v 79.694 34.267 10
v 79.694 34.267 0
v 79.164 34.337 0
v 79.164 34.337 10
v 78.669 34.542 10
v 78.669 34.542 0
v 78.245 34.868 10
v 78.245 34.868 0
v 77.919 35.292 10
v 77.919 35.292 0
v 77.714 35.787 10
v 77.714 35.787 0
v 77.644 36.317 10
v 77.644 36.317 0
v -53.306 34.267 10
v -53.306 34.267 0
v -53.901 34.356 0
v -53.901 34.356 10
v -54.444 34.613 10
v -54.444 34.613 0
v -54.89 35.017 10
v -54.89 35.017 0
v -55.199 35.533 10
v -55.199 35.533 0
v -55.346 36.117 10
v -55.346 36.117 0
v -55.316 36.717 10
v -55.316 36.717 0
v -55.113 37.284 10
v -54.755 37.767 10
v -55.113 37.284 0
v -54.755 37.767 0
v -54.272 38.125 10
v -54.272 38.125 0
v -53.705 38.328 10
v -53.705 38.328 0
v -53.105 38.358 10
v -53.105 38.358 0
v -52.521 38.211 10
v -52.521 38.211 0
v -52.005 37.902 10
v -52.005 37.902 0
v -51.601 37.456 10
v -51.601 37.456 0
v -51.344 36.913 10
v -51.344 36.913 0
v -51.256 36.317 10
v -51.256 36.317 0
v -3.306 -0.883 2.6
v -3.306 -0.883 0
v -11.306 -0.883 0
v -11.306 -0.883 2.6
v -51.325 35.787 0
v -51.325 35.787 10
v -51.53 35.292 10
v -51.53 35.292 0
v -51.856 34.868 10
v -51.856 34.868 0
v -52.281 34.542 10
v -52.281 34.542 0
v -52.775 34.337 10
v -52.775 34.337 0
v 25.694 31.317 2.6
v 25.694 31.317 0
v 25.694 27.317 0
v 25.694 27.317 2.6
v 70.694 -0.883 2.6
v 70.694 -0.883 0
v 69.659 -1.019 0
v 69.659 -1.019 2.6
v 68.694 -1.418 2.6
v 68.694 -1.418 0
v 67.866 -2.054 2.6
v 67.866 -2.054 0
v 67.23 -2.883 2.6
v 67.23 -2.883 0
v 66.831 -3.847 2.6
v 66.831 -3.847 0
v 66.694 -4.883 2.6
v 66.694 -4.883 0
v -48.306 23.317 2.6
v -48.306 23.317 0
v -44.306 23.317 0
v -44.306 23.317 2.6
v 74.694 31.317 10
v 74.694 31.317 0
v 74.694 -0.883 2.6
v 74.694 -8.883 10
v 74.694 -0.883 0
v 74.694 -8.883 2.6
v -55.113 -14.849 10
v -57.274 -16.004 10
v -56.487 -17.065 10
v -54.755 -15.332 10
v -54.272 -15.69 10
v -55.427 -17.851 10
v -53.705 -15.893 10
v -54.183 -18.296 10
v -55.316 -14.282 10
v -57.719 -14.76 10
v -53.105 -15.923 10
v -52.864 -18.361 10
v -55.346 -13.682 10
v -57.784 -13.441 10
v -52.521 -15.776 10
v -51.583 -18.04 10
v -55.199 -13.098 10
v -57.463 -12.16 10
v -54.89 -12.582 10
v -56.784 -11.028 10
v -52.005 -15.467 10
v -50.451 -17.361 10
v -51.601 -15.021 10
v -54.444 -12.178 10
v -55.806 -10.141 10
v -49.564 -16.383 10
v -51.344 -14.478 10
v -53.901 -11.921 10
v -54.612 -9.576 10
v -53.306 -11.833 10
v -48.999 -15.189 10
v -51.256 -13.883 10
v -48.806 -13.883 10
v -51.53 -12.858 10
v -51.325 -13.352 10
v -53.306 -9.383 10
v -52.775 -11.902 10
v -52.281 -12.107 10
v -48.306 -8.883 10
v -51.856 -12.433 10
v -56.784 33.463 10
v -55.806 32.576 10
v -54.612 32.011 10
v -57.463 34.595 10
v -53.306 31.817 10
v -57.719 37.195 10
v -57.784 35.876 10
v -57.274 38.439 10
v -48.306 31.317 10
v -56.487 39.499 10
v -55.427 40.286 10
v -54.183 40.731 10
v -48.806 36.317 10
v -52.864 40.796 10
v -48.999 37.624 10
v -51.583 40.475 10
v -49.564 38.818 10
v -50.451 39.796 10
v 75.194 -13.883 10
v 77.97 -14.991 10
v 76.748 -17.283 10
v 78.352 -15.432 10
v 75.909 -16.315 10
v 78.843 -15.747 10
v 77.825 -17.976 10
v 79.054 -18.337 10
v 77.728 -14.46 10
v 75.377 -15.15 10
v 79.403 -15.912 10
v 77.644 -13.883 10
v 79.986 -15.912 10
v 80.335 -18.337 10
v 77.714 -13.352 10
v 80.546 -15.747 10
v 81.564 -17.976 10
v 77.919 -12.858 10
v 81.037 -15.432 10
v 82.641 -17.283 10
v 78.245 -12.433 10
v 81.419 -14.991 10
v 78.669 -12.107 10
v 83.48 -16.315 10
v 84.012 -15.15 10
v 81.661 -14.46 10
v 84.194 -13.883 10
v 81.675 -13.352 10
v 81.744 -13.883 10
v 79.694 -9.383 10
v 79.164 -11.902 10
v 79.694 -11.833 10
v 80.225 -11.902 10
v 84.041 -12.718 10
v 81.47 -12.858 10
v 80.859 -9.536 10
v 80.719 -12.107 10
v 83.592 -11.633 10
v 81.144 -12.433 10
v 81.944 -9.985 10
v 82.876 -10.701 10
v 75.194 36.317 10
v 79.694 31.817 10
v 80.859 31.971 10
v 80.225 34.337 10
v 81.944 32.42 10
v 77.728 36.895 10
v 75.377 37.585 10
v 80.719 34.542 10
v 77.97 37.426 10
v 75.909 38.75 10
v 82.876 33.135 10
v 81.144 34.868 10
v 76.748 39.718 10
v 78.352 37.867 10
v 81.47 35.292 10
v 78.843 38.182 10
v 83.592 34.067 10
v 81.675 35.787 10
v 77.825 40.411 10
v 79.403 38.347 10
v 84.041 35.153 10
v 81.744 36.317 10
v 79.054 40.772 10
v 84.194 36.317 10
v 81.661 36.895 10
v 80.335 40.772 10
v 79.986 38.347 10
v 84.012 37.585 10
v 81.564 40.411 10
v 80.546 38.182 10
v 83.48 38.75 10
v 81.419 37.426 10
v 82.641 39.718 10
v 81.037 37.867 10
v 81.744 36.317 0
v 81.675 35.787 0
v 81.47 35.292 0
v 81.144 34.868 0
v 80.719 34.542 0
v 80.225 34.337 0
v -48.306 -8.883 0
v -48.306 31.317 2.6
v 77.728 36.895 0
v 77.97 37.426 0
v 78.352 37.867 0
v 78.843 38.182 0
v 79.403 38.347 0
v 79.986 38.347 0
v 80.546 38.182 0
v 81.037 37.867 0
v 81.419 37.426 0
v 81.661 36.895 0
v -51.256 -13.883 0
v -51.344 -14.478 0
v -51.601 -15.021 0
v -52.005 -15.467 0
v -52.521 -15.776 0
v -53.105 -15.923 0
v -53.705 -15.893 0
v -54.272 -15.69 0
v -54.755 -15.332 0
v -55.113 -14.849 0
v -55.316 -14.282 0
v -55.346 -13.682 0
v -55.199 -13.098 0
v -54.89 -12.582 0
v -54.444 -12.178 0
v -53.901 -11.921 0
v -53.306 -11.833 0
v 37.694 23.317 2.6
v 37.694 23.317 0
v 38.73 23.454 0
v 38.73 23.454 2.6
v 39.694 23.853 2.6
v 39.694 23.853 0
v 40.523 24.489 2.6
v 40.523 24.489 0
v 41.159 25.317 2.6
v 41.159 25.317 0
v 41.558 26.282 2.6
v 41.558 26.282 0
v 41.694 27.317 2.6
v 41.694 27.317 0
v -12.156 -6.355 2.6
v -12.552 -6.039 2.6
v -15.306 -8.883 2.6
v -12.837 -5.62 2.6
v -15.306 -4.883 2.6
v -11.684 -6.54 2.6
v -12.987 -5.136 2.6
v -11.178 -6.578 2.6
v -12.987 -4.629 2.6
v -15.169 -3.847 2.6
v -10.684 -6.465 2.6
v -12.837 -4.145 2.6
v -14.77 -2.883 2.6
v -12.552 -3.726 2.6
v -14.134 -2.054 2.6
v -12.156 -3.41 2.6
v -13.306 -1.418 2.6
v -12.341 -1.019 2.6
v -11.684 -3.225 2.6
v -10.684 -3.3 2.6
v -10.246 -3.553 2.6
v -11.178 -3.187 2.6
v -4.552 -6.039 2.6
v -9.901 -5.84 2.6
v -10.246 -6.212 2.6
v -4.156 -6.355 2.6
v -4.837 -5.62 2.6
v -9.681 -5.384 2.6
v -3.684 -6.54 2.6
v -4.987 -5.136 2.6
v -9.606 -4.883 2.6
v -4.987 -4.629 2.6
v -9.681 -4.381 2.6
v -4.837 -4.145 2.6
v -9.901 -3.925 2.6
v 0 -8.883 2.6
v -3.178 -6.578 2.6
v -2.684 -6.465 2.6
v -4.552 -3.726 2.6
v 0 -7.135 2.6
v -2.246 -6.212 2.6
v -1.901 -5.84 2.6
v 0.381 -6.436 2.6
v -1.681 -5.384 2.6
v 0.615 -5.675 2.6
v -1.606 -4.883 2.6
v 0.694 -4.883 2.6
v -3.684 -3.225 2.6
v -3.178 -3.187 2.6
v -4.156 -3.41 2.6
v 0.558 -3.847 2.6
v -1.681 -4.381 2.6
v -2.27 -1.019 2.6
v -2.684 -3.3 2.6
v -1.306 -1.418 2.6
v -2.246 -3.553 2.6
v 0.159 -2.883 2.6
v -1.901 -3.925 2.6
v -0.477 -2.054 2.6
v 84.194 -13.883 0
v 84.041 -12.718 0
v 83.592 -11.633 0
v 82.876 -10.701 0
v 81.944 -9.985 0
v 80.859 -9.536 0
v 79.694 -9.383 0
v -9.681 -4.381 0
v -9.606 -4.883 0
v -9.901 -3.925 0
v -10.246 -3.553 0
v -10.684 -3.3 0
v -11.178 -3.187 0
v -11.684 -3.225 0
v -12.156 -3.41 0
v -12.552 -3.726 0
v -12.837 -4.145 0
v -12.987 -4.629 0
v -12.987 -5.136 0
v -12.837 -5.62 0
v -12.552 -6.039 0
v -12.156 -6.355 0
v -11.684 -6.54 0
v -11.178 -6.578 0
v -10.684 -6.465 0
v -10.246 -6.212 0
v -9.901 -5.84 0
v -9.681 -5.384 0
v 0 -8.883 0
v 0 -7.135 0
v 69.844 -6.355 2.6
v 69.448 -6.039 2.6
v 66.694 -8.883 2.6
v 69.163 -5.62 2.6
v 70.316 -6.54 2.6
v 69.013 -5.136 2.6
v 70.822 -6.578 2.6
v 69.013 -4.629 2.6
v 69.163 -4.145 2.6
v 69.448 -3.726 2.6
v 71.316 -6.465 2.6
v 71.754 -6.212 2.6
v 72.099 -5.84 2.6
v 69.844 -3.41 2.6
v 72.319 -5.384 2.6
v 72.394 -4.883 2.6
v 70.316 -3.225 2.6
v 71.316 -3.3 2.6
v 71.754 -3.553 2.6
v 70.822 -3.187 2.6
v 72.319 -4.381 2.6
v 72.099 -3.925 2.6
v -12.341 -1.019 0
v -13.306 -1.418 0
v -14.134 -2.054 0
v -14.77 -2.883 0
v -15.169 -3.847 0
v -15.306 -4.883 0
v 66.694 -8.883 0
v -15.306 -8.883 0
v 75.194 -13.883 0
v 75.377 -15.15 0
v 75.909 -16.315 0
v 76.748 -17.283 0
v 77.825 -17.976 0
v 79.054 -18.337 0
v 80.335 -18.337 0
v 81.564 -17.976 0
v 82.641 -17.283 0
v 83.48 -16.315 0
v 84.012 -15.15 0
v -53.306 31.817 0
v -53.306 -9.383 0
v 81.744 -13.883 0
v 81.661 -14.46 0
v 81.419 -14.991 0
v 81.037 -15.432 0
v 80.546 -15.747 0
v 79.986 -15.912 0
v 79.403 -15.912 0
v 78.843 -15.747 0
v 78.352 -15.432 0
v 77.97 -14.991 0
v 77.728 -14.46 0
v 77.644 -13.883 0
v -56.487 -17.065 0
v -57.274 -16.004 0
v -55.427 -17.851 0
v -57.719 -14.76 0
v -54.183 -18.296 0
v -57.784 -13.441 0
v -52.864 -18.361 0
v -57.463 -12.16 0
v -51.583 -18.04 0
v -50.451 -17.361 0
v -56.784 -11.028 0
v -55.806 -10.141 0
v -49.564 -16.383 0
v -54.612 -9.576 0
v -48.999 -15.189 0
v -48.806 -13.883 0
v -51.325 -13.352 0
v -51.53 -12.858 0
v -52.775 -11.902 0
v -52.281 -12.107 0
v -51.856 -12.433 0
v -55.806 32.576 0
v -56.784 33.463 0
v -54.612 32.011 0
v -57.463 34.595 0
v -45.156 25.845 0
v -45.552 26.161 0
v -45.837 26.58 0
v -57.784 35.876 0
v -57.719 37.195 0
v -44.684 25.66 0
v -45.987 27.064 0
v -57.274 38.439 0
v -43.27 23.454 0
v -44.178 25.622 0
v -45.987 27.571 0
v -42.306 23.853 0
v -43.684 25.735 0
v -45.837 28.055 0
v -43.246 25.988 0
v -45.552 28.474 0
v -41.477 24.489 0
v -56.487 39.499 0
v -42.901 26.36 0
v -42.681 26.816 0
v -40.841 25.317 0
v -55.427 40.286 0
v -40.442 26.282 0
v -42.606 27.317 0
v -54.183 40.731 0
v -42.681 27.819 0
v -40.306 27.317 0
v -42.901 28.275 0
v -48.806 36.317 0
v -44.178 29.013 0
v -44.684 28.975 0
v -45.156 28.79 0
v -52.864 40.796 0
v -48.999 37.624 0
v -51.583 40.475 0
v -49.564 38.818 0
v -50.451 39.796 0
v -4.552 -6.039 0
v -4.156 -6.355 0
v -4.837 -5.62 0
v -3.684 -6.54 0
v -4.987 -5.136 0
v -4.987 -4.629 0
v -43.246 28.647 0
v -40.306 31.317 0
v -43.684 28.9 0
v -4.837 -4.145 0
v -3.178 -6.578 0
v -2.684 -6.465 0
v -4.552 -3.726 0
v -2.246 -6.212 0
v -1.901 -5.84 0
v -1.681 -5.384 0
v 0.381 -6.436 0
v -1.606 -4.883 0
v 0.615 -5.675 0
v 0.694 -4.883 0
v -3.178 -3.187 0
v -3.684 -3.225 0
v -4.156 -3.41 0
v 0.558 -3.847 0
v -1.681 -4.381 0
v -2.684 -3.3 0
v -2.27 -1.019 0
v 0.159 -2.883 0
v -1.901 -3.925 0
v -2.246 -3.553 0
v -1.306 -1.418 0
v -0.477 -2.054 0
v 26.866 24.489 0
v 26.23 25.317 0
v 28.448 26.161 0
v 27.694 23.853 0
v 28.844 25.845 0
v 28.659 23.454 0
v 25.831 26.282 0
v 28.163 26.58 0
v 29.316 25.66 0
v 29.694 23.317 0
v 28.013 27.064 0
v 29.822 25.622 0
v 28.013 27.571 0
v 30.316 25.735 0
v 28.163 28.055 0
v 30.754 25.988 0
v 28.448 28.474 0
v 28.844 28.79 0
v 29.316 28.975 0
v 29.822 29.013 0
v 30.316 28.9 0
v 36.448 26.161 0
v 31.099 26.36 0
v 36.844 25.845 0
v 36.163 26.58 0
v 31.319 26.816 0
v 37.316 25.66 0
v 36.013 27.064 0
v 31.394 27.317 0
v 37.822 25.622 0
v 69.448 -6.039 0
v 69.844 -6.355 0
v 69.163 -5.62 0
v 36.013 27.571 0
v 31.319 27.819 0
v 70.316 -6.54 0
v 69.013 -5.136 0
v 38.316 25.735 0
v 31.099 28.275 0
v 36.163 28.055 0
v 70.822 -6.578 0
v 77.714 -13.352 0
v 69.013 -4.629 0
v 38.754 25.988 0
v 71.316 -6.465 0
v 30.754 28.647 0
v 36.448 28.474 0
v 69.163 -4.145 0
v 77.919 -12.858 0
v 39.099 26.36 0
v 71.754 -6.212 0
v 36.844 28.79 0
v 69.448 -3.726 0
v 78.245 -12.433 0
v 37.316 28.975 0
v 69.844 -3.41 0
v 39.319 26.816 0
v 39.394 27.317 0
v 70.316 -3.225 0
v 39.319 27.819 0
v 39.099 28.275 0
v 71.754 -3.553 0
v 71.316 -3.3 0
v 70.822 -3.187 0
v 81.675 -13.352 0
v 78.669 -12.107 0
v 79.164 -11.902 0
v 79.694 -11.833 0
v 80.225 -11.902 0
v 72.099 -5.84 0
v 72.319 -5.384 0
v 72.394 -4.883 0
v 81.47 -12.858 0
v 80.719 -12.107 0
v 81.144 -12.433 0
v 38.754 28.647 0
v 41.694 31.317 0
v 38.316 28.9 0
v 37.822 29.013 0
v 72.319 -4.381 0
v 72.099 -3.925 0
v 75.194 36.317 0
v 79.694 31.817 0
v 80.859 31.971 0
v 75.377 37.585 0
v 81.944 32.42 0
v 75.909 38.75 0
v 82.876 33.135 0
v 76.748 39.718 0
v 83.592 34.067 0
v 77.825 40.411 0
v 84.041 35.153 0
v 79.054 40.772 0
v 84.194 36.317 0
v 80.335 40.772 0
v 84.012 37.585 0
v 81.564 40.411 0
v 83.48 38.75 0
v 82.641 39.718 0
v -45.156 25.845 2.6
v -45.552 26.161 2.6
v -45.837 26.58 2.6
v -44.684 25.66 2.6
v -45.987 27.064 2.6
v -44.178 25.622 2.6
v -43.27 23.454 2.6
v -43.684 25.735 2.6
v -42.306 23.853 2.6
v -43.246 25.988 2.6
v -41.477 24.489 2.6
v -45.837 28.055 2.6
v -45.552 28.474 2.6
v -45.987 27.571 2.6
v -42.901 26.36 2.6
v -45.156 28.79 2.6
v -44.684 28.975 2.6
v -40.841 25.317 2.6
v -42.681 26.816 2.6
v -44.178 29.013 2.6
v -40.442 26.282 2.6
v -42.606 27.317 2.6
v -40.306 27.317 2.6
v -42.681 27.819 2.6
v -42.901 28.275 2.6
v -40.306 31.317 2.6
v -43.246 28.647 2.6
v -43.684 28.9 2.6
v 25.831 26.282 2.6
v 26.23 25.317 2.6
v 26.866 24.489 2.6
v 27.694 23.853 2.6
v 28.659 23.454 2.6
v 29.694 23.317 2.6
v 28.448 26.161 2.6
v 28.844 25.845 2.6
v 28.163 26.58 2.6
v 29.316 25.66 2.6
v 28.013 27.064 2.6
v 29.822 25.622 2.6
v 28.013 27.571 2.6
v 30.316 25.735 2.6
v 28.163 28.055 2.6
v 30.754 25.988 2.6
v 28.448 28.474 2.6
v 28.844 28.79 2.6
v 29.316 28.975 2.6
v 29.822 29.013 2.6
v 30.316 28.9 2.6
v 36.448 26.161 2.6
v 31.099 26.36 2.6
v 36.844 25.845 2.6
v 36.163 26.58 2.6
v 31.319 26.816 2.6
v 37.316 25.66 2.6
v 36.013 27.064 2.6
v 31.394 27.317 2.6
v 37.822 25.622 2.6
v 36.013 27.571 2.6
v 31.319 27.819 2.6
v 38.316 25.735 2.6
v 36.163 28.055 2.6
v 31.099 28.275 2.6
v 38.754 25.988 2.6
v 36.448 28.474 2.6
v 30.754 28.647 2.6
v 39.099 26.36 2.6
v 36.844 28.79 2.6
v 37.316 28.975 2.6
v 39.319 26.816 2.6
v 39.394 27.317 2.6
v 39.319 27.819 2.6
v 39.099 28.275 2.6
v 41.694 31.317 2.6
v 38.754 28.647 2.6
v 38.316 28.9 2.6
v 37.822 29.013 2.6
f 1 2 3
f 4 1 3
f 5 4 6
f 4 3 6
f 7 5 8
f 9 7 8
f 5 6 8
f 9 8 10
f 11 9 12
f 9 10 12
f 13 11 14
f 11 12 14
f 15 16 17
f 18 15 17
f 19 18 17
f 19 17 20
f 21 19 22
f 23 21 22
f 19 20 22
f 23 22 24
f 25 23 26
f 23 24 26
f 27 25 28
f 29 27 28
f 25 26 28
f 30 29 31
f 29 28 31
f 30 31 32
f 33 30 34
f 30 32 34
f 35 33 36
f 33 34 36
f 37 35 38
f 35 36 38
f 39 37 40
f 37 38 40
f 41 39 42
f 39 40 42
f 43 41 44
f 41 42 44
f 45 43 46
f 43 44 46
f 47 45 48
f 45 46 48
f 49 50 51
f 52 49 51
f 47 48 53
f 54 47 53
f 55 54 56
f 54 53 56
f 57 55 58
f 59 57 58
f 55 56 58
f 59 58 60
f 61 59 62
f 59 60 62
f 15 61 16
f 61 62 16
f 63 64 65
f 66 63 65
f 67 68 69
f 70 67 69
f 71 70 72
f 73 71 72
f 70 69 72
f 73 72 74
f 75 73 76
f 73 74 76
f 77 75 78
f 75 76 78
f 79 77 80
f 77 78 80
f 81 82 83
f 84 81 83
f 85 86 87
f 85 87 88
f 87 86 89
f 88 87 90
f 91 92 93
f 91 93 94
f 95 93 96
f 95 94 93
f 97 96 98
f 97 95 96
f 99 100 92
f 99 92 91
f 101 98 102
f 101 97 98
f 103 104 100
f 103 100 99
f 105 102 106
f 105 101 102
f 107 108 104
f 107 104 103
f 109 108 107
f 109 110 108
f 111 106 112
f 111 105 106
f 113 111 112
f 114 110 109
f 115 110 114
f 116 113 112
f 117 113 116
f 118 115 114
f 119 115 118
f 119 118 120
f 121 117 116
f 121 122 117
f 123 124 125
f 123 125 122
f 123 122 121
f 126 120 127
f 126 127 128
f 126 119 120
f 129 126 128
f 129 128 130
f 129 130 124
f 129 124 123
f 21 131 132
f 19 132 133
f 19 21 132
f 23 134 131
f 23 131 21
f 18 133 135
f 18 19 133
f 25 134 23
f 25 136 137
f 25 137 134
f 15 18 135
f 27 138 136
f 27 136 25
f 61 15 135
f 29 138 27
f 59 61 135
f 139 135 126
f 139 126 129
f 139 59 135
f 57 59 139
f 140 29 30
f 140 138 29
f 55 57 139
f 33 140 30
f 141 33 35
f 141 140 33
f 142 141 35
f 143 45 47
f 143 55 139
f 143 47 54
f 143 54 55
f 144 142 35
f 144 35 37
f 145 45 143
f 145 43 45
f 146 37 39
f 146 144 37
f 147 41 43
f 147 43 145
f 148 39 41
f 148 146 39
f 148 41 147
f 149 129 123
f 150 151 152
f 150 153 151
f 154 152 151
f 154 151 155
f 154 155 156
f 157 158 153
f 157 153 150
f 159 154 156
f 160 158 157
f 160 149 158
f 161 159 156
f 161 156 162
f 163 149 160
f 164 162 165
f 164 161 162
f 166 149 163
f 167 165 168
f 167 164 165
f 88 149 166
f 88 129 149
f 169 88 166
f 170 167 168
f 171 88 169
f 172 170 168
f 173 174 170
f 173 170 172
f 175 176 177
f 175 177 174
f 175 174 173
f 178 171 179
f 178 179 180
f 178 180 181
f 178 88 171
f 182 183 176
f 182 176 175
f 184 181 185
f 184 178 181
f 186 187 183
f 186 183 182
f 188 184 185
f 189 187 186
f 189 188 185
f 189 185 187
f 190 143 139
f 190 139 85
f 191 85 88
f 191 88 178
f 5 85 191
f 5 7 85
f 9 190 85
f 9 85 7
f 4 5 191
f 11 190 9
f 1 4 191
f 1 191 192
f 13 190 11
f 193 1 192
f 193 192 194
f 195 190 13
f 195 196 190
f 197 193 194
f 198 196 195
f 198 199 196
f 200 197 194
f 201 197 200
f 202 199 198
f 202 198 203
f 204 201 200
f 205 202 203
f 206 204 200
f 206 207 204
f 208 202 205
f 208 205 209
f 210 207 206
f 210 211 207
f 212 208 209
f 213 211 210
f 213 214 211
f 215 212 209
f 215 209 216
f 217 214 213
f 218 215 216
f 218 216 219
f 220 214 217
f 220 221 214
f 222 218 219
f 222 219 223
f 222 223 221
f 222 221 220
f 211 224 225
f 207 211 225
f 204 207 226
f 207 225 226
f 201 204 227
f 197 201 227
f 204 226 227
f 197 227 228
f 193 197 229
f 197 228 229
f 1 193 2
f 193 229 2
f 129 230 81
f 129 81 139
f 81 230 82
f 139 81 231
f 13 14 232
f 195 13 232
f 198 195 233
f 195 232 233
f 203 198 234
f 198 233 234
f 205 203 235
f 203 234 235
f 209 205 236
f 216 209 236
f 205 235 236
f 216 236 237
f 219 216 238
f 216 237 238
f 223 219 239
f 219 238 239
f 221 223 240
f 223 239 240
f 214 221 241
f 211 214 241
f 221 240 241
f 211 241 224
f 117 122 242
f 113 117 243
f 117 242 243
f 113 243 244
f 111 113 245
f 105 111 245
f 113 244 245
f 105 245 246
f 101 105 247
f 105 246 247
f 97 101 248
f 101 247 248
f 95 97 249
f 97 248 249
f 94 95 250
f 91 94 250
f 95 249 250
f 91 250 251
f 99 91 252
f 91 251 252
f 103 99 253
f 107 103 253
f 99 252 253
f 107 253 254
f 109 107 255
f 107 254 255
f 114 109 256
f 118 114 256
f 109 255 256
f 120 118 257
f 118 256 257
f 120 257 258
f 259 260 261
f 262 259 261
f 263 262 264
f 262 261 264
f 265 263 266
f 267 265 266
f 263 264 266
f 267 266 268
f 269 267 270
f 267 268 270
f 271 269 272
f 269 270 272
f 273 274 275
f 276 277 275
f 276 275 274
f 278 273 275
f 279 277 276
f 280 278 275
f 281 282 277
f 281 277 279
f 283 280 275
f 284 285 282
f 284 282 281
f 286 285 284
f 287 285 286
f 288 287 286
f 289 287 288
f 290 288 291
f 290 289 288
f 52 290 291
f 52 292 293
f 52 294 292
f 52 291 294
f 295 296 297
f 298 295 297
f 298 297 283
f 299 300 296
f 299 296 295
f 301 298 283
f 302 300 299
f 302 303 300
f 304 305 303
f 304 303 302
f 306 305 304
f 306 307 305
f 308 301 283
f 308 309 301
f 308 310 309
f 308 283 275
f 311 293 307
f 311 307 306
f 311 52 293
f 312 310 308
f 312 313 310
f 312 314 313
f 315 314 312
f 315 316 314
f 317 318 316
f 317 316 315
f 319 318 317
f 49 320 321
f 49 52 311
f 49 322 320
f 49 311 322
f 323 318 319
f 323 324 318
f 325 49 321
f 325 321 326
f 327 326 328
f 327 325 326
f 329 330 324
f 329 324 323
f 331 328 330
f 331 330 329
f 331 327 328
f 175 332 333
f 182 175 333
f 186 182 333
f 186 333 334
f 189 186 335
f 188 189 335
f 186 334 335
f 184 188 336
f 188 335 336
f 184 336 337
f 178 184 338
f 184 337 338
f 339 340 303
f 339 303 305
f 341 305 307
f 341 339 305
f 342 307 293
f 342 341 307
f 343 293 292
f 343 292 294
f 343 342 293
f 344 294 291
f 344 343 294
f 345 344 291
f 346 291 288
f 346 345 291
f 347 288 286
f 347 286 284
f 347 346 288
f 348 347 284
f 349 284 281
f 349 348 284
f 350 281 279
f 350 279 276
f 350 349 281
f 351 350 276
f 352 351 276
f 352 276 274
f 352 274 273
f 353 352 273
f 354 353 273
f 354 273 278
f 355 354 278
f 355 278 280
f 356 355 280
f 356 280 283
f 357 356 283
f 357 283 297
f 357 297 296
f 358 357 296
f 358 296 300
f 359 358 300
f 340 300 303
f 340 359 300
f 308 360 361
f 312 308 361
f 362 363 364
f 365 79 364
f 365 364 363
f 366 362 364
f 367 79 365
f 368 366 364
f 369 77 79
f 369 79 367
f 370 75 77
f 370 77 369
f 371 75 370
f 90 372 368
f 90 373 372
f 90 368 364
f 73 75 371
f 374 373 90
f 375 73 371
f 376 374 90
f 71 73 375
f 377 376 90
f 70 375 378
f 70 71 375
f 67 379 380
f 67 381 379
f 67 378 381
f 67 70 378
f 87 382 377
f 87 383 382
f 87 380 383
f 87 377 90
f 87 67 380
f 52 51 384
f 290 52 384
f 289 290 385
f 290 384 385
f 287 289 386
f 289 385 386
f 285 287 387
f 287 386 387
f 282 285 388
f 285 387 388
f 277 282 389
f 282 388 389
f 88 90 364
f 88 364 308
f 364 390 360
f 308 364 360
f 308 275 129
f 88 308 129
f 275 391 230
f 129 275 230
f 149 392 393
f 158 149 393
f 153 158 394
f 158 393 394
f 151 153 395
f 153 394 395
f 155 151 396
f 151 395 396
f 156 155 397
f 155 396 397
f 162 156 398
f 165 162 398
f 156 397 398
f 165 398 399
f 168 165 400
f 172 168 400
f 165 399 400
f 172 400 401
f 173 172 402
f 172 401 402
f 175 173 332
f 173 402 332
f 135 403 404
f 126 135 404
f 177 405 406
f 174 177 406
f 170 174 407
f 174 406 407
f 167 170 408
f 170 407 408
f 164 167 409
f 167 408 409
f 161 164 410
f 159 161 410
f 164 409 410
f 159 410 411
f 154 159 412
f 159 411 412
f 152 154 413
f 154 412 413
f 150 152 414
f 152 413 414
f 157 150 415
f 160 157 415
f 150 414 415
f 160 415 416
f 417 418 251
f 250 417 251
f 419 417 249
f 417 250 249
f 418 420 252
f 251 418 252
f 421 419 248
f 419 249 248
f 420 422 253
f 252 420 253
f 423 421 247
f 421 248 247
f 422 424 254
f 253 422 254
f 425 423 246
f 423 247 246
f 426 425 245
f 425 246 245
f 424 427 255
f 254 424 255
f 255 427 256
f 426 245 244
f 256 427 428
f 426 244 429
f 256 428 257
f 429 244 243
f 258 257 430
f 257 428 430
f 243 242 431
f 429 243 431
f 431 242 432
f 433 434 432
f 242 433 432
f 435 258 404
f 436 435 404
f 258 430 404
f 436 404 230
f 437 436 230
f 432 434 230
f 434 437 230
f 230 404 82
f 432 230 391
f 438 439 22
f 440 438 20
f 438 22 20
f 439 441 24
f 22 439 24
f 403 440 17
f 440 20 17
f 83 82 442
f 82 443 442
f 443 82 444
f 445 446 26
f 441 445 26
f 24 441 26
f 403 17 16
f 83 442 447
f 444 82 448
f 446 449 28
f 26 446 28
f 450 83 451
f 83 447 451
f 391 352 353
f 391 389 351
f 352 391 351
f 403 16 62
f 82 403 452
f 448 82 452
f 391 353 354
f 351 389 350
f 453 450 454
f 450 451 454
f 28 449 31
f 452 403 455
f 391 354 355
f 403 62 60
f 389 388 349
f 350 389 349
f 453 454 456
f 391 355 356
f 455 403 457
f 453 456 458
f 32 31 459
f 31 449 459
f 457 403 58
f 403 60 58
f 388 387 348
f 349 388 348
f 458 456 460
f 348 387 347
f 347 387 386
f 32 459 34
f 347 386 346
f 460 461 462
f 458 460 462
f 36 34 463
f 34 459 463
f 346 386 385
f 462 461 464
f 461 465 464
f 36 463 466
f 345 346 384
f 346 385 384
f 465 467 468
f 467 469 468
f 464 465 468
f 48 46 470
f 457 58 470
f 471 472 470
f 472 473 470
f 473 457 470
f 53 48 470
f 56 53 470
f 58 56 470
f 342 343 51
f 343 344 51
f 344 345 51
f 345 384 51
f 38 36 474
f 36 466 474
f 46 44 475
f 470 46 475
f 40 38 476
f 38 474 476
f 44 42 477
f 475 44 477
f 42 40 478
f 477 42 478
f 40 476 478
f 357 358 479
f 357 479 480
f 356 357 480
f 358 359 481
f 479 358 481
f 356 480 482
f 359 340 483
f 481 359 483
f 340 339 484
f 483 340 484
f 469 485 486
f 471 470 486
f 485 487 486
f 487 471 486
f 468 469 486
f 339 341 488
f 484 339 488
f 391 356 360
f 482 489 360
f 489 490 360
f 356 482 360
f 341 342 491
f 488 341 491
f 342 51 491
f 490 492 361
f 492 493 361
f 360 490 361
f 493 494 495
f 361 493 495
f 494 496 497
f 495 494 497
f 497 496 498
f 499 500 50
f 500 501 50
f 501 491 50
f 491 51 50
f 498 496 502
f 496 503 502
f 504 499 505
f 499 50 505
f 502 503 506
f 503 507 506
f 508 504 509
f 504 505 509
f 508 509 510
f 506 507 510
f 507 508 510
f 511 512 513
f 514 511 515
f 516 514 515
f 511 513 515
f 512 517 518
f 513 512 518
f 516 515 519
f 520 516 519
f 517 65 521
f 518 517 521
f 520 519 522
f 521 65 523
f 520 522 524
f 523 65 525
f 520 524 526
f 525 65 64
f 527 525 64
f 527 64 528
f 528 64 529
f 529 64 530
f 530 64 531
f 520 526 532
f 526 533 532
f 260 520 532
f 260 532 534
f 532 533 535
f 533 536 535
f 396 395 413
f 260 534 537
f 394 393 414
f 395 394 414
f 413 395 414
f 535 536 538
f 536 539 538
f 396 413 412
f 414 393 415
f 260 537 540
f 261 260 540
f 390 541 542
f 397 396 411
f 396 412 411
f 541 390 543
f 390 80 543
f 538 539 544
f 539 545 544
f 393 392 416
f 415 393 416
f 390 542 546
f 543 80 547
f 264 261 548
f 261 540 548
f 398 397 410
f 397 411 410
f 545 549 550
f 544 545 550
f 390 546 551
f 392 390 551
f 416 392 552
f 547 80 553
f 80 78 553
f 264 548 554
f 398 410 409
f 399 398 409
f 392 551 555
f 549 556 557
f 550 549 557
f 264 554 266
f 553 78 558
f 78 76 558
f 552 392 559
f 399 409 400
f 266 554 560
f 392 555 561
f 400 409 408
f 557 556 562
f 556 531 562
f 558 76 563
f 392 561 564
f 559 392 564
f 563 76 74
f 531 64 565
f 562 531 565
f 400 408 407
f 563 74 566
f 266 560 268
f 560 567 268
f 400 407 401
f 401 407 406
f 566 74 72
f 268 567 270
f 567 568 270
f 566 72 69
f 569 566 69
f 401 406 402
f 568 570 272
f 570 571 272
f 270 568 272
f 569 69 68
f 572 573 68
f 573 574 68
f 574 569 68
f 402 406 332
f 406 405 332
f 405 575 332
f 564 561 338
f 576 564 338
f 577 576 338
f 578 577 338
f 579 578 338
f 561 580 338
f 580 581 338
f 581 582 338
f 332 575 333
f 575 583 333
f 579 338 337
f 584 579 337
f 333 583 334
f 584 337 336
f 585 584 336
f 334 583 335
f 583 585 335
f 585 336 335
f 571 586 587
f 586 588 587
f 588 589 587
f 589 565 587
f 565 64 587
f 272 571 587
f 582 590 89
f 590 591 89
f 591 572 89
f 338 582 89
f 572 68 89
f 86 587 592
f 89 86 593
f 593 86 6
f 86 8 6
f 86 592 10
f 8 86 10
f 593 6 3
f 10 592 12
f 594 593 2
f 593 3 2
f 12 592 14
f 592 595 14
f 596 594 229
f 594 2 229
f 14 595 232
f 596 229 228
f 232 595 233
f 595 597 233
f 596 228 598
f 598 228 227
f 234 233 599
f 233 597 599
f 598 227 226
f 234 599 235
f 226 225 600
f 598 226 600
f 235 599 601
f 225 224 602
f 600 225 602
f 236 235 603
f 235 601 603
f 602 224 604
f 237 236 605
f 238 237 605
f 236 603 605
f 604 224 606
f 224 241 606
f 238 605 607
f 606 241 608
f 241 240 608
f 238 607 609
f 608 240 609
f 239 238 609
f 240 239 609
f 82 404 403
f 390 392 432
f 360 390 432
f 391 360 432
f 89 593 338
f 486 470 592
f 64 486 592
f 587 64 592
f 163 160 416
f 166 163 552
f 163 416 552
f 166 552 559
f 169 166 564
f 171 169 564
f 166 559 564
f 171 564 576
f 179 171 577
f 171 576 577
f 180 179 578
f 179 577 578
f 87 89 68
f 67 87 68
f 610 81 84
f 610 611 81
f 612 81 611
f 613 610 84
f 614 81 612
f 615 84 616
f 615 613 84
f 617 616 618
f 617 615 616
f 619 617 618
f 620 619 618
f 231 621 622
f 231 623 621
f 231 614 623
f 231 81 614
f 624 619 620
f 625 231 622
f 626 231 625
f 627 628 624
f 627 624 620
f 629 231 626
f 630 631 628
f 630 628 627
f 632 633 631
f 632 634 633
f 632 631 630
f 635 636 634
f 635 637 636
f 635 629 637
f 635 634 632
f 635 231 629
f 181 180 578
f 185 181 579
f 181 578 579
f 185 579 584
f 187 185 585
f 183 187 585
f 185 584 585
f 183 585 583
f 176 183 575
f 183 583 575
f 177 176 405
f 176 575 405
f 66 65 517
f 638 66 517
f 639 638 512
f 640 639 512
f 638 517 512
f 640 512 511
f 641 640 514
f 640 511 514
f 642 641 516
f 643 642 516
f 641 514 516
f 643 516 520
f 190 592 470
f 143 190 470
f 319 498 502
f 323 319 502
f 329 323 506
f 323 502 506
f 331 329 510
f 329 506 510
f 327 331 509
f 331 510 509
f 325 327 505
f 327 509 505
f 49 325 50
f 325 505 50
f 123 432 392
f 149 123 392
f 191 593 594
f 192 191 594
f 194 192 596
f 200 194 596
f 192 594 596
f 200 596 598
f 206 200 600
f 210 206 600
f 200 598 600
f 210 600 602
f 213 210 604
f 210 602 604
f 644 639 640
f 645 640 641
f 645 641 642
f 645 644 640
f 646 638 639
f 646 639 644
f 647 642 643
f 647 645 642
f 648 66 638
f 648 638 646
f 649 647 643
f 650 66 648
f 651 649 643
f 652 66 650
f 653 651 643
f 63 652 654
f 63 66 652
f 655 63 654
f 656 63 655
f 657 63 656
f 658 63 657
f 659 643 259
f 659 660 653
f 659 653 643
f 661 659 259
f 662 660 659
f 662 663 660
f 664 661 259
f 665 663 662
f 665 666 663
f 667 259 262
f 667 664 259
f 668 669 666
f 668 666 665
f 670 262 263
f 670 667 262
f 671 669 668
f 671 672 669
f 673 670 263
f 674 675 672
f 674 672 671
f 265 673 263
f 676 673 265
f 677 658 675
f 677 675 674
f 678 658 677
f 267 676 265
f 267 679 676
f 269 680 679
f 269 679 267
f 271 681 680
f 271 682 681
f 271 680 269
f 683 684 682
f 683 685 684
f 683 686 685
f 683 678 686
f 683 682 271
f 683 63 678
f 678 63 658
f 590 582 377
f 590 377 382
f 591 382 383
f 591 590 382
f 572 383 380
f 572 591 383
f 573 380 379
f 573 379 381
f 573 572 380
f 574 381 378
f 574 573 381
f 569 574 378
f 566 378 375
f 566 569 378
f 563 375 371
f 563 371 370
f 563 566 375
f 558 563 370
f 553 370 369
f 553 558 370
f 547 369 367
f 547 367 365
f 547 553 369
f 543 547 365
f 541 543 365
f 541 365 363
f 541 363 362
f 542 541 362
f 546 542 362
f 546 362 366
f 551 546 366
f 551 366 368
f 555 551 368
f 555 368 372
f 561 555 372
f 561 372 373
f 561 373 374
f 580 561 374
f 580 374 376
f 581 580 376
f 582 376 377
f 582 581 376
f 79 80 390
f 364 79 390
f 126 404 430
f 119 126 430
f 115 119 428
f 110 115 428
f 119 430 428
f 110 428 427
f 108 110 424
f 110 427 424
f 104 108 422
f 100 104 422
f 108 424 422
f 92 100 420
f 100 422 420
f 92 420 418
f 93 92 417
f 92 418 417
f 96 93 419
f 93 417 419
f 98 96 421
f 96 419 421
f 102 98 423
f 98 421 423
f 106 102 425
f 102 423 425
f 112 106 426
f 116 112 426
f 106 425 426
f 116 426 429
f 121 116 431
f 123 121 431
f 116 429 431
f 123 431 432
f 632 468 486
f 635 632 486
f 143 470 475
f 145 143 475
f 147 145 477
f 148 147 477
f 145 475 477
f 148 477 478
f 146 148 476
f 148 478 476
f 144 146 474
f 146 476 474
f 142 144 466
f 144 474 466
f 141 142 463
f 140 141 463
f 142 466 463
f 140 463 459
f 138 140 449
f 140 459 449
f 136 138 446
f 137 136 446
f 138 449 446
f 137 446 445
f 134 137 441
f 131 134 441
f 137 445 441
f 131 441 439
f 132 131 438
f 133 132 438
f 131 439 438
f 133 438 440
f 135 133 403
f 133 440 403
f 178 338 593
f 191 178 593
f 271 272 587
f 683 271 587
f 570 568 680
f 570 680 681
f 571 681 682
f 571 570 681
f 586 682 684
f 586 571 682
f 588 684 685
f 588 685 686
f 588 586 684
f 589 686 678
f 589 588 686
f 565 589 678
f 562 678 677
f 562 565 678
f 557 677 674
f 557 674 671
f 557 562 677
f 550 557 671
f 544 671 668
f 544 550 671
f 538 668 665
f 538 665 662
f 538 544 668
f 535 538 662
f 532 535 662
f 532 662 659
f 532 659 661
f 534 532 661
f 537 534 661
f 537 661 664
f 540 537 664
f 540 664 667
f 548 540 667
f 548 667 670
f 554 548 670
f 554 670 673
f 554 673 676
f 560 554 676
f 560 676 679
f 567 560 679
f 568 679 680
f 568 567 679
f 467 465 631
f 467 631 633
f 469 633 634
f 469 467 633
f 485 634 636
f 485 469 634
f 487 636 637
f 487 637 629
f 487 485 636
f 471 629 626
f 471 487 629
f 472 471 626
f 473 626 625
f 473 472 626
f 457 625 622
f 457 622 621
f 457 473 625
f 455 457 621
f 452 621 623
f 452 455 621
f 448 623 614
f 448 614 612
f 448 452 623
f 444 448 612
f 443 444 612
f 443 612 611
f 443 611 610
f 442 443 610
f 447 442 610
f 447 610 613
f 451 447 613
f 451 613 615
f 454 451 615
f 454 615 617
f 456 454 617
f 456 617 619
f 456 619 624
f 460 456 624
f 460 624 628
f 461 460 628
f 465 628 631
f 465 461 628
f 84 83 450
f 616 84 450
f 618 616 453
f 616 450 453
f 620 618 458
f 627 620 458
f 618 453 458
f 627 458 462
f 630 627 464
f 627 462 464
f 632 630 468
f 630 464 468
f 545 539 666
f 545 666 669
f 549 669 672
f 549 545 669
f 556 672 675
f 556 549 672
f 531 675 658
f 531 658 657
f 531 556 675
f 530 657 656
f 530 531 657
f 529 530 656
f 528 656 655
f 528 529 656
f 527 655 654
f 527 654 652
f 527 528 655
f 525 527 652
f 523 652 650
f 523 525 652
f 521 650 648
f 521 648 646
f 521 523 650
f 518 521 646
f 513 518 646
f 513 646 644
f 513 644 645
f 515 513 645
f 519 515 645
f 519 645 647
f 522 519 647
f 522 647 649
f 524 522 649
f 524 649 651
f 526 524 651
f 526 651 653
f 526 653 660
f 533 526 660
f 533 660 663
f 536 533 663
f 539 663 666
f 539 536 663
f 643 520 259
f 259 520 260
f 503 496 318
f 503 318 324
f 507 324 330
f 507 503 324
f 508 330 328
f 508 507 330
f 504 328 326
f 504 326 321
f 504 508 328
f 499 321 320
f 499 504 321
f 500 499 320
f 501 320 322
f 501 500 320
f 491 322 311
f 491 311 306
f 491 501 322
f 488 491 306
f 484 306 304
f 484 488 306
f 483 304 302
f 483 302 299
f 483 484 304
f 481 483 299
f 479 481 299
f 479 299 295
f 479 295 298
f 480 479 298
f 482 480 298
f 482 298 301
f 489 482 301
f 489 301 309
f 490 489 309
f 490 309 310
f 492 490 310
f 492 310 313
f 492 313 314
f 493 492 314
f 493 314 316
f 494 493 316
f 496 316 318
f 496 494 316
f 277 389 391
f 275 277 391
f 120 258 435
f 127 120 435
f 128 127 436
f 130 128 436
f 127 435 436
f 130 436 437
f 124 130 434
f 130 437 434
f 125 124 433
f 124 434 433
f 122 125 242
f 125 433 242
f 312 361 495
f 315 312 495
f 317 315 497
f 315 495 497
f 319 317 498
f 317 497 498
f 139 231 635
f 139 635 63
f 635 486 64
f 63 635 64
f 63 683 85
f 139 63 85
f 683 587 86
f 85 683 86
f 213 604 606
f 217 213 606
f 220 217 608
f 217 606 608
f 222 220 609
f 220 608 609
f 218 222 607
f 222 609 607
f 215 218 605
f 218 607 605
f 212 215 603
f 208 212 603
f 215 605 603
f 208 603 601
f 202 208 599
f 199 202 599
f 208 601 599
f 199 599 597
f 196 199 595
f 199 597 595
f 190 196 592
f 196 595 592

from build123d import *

# Parameters (mm, degrees)
F1_DEPTH = 10
F0_R     = 1.7
F2_DEPTH = 2.6


with BuildPart() as f1:
    # F0 (on Top) → F1 (new body)
    with BuildSketch(Plane.XY):
        with BuildLine():
            Line((75.1944829105, 36.3174733537), (-48.8055170895, 36.3174733537))
            ThreePointArc((-48.8055170895, 36.3174733537), (-50.1235365742, 33.1354928384), (-53.3055170895, 31.8174733537))
            Line((-53.3055170895, 31.8174733537), (-53.3055170895, -9.3825266463))
            ThreePointArc((-53.3055170895, -9.3825266463), (-50.1235365742, -10.7005461309), (-48.8055170895, -13.8825266463))
            Line((-48.8055170895, -13.8825266463), (75.1944829105, -13.8825266463))
            ThreePointArc((75.1944829105, -13.8825266463), (76.5125023952, -10.7005461309), (79.6944829105, -9.3825266463))
            Line((79.6944829105, -9.3825266463), (79.6944829105, 31.8174733537))
            ThreePointArc((79.6944829105, 31.8174733537), (76.5125023952, 33.1354928384), (75.1944829105, 36.3174733537))
        make_face()
        Polygon((-44.3055170895, 31.3174733537), (-40.3055170895, 31.3174733537), (25.6944829105, 31.3174733537), (29.6944829105, 31.3174733537), (37.6944829105, 31.3174733537), (41.6944829105, 31.3174733537), (74.6944829105, 31.3174733537), (74.6944829105, -0.8825266463), (74.6944829105, -4.8825266463), (74.6944829105, -8.8825266463), (70.6944829105, -8.8825266463), (66.6944829105, -8.8825266463), (0, -8.8825266463), (-3.3055170895, -8.8825266463), (-11.3055170999, -8.8825266463), (-15.3055170895, -8.8825266463), (-48.3055170895, -8.8825266463), (-48.3055170895, 23.3174733537), (-48.3055170895, 27.3174733537), (-48.3055170895, 31.3174733537), align=None, mode=Mode.SUBTRACT)
        with BuildLine():
            ThreePointArc((-53.3055170895, 34.2674733537), (-54.7550859909, 37.7670422552), (-51.2555170895, 36.3174733537))
            Line((-51.2555170895, 36.3174733537), (-48.8055170895, 36.3174733537))
            ThreePointArc((-48.8055170895, 36.3174733537), (-56.4874976048, 39.4994538691), (-53.3055170895, 31.8174733537))
            Line((-53.3055170895, 31.8174733537), (-53.3055170895, 34.2674733537))
        make_face()
        with BuildLine():
            Line((-48.8055170895, 36.3174733537), (-51.2555170895, 36.3174733537))
            ThreePointArc((-51.2555170895, 36.3174733537), (-51.8559481881, 34.8679044523), (-53.3055170895, 34.2674733537))
            Line((-53.3055170895, 34.2674733537), (-53.3055170895, 31.8174733537))
            ThreePointArc((-53.3055170895, 31.8174733537), (-50.1235365742, 33.1354928384), (-48.8055170895, 36.3174733537))
        make_face()
        with BuildLine():
            Line((-53.3055170895, -11.8325266463), (-53.3055170895, -9.3825266463))
            ThreePointArc((-53.3055170895, -9.3825266463), (-56.4874976048, -17.0645071616), (-48.8055170895, -13.8825266463))
            Line((-48.8055170895, -13.8825266463), (-51.2555170895, -13.8825266463))
            ThreePointArc((-51.2555170895, -13.8825266463), (-54.7550859909, -15.3320955477), (-53.3055170895, -11.8325266463))
        make_face()
        with BuildLine():
            ThreePointArc((-48.8055170895, -13.8825266463), (-50.1235365742, -10.7005461309), (-53.3055170895, -9.3825266463))
            Line((-53.3055170895, -9.3825266463), (-53.3055170895, -11.8325266463))
            ThreePointArc((-53.3055170895, -11.8325266463), (-51.8559481881, -12.4329577448), (-51.2555170895, -13.8825266463))
            Line((-51.2555170895, -13.8825266463), (-48.8055170895, -13.8825266463))
        make_face()
        with BuildLine():
            ThreePointArc((84.1944829105, -13.8825266463), (82.8764634258, -10.7005461309), (79.6944829105, -9.3825266463))
            Line((79.6944829105, -9.3825266463), (79.6944829105, -11.8325266463))
            ThreePointArc((79.6944829105, -11.8325266463), (81.1440518119, -12.4329577448), (81.7444829105, -13.8825266463))
            ThreePointArc((81.7444829105, -13.8825266463), (79.6944829105, -15.9325266463), (77.6444829105, -13.8825266463))
            Line((77.6444829105, -13.8825266463), (75.1944829105, -13.8825266463))
            ThreePointArc((75.1944829105, -13.8825266463), (79.6944829105, -18.3825266463), (84.1944829105, -13.8825266463))
        make_face()
        with BuildLine():
            Line((79.6944829105, -11.8325266463), (79.6944829105, -9.3825266463))
            ThreePointArc((79.6944829105, -9.3825266463), (76.5125023952, -10.7005461309), (75.1944829105, -13.8825266463))
            Line((75.1944829105, -13.8825266463), (77.6444829105, -13.8825266463))
            ThreePointArc((77.6444829105, -13.8825266463), (78.2449140091, -12.4329577448), (79.6944829105, -11.8325266463))
        make_face()
        with BuildLine():
            Line((77.6444829105, 36.3174733537), (75.1944829105, 36.3174733537))
            ThreePointArc((75.1944829105, 36.3174733537), (76.5125023952, 33.1354928384), (79.6944829105, 31.8174733537))
            Line((79.6944829105, 31.8174733537), (79.6944829105, 34.2674733537))
            ThreePointArc((79.6944829105, 34.2674733537), (78.2449140091, 34.8679044523), (77.6444829105, 36.3174733537))
        make_face()
        with BuildLine():
            ThreePointArc((84.1944829105, 36.3174733537), (79.6944829105, 40.8174733537), (75.1944829105, 36.3174733537))
            Line((75.1944829105, 36.3174733537), (77.6444829105, 36.3174733537))
            ThreePointArc((77.6444829105, 36.3174733537), (79.6944829105, 38.3674733537), (81.7444829105, 36.3174733537))
            ThreePointArc((81.7444829105, 36.3174733537), (81.1440518119, 34.8679044523), (79.6944829105, 34.2674733537))
            Line((79.6944829105, 34.2674733537), (79.6944829105, 31.8174733537))
            ThreePointArc((79.6944829105, 31.8174733537), (82.8764634258, 33.1354928384), (84.1944829105, 36.3174733537))
        make_face()
    extrude(amount=F1_DEPTH)

    # F0 (on Top) → F2 (join)
    with BuildSketch(Plane.XY):
        with BuildLine():
            Line((-40.3055170895, 27.3174733537), (-40.3055170895, 31.3174733537))
            Line((-40.3055170895, 31.3174733537), (-44.3055170895, 31.3174733537))
            ThreePointArc((-44.3055170895, 31.3174733537), (-41.4770899647, 30.1459004785), (-40.3055170895, 27.3174733537))
        make_face()
        with BuildLine():
            ThreePointArc((-48.3055170895, 27.3174733537), (-47.1339442142, 30.1459004785), (-44.3055170895, 31.3174733537))
            Line((-44.3055170895, 31.3174733537), (-48.3055170895, 31.3174733537))
            Line((-48.3055170895, 31.3174733537), (-48.3055170895, 27.3174733537))
        make_face()
        with BuildLine():
            ThreePointArc((-44.3055170895, 23.3174733537), (-47.1339442142, 24.489046229), (-48.3055170895, 27.3174733537))
            Line((-48.3055170895, 27.3174733537), (-48.3055170895, 23.3174733537))
            Line((-48.3055170895, 23.3174733537), (-44.3055170895, 23.3174733537))
        make_face()
        with BuildLine():
            ThreePointArc((-40.3055170895, 27.3174733537), (-41.4770899647, 30.1459004785), (-44.3055170895, 31.3174733537))
            ThreePointArc((-44.3055170895, 31.3174733537), (-47.1339442142, 30.1459004785), (-48.3055170895, 27.3174733537))
            ThreePointArc((-48.3055170895, 27.3174733537), (-47.1339442142, 24.489046229), (-44.3055170895, 23.3174733537))
            ThreePointArc((-44.3055170895, 23.3174733537), (-41.4770899647, 24.489046229), (-40.3055170895, 27.3174733537))
        make_face()
        with Locations((-44.3055170895, 27.3174733537)):
            Circle(F0_R, mode=Mode.SUBTRACT)
        with BuildLine():
            ThreePointArc((-11.3055170895, -0.8825266463), (-8.4770899647, -2.0540995215), (-7.3055170895, -4.8825266463))
            ThreePointArc((-7.3055170895, -4.8825266463), (-6.1339442142, -2.0540995215), (-3.3055170895, -0.8825266463))
            Line((-3.3055170895, -0.8825266463), (-11.3055170895, -0.8825266463))
        make_face()
        with BuildLine():
            ThreePointArc((-15.3055170895, -4.8825266463), (-14.1339442179, -7.7109537673), (-11.3055170999, -8.8825266463))
            ThreePointArc((-11.3055170999, -8.8825266463), (-8.4770899684, -7.7109537747), (-7.3055170895, -4.8825266463))
            ThreePointArc((-7.3055170895, -4.8825266463), (-8.4770899647, -2.0540995215), (-11.3055170895, -0.8825266463))
            ThreePointArc((-11.3055170895, -0.8825266463), (-14.1339442142, -2.0540995215), (-15.3055170895, -4.8825266463))
        make_face()
        with Locations((-11.3055170895, -4.8825266463)):
            Circle(F0_R, mode=Mode.SUBTRACT)
        with BuildLine():
            ThreePointArc((-7.3055170895, -4.8825266463), (-6.1339442142, -7.710953771), (-3.3055170895, -8.8825266463))
            ThreePointArc((-3.3055170895, -8.8825266463), (-1.4360014945, -8.4187550665), (0, -7.1349823664))
            ThreePointArc((0, -7.1349823664), (0.516921161, -6.0610705873), (0.6944829105, -4.8825266463))
            ThreePointArc((0.6944829105, -4.8825266463), (-0.4770899647, -2.0540995215), (-3.3055170895, -0.8825266463))
            ThreePointArc((-3.3055170895, -0.8825266463), (-6.1339442142, -2.0540995215), (-7.3055170895, -4.8825266463))
        make_face()
        with Locations((-3.3055170895, -4.8825266463)):
            Circle(F0_R, mode=Mode.SUBTRACT)
        with BuildLine():
            ThreePointArc((-7.3055170895, -4.8825266463), (-8.4770899684, -7.7109537747), (-11.3055170999, -8.8825266463))
            Line((-11.3055170999, -8.8825266463), (-3.3055170895, -8.8825266463))
            ThreePointArc((-3.3055170895, -8.8825266463), (-6.1339442142, -7.710953771), (-7.3055170895, -4.8825266463))
        make_face()
        with BuildLine():
            ThreePointArc((0, -7.1349823664), (-1.4360014945, -8.4187550665), (-3.3055170895, -8.8825266463))
            Line((-3.3055170895, -8.8825266463), (0, -8.8825266463))
            Line((0, -8.8825266463), (0, -7.1349823664))
        make_face()
        with BuildLine():
            Line((-15.3055170895, -4.8825266463), (-15.3055170895, -8.8825266463))
            Line((-15.3055170895, -8.8825266463), (-11.3055170999, -8.8825266463))
            ThreePointArc((-11.3055170999, -8.8825266463), (-14.1339442179, -7.7109537673), (-15.3055170895, -4.8825266463))
        make_face()
        with BuildLine():
            ThreePointArc((41.6944829105, 27.3174733537), (40.5229100353, 30.1459004785), (37.6944829105, 31.3174733537))
            ThreePointArc((37.6944829105, 31.3174733537), (34.8660557858, 30.1459004785), (33.6944829105, 27.3174733537))
            ThreePointArc((33.6944829105, 27.3174733537), (34.8660557858, 24.489046229), (37.6944829105, 23.3174733537))
            ThreePointArc((37.6944829105, 23.3174733537), (40.5229100353, 24.489046229), (41.6944829105, 27.3174733537))
        make_face()
        with Locations((37.6944829105, 27.3174733537)):
            Circle(F0_R, mode=Mode.SUBTRACT)
        with BuildLine():
            Line((29.6944829105, 31.3174733537), (25.6944829105, 31.3174733537))
            Line((25.6944829105, 31.3174733537), (25.6944829105, 27.3174733537))
            ThreePointArc((25.6944829105, 27.3174733537), (26.8660557858, 30.1459004785), (29.6944829105, 31.3174733537))
        make_face()
        with BuildLine():
            ThreePointArc((37.6944829105, 23.3174733537), (34.8660557858, 24.489046229), (33.6944829105, 27.3174733537))
            ThreePointArc((33.6944829105, 27.3174733537), (32.5229100353, 24.489046229), (29.6944829105, 23.3174733537))
            Line((29.6944829105, 23.3174733537), (37.6944829105, 23.3174733537))
        make_face()
        with BuildLine():
            Line((41.6944829105, 31.3174733537), (37.6944829105, 31.3174733537))
            ThreePointArc((37.6944829105, 31.3174733537), (40.5229100353, 30.1459004785), (41.6944829105, 27.3174733537))
            Line((41.6944829105, 27.3174733537), (41.6944829105, 31.3174733537))
        make_face()
        with BuildLine():
            Line((37.6944829105, 31.3174733537), (29.6944829105, 31.3174733537))
            ThreePointArc((29.6944829105, 31.3174733537), (32.5229100353, 30.1459004785), (33.6944829105, 27.3174733537))
            ThreePointArc((33.6944829105, 27.3174733537), (34.8660557858, 30.1459004785), (37.6944829105, 31.3174733537))
        make_face()
        with BuildLine():
            ThreePointArc((33.6944829105, 27.3174733537), (32.5229100353, 30.1459004785), (29.6944829105, 31.3174733537))
            ThreePointArc((29.6944829105, 31.3174733537), (26.8660557858, 30.1459004785), (25.6944829105, 27.3174733537))
            ThreePointArc((25.6944829105, 27.3174733537), (26.8660557858, 24.489046229), (29.6944829105, 23.3174733537))
            ThreePointArc((29.6944829105, 23.3174733537), (32.5229100353, 24.489046229), (33.6944829105, 27.3174733537))
        make_face()
        with Locations((29.6944829105, 27.3174733537)):
            Circle(F0_R, mode=Mode.SUBTRACT)
        with BuildLine():
            ThreePointArc((70.6944829105, -8.8825266463), (73.5229100353, -7.710953771), (74.6944829105, -4.8825266463))
            ThreePointArc((74.6944829105, -4.8825266463), (73.5229100353, -2.0540995215), (70.6944829105, -0.8825266463))
            ThreePointArc((70.6944829105, -0.8825266463), (67.8660557858, -2.0540995215), (66.6944829105, -4.8825266463))
            ThreePointArc((66.6944829105, -4.8825266463), (67.8660557858, -7.710953771), (70.6944829105, -8.8825266463))
        make_face()
        with Locations((70.6944829105, -4.8825266463)):
            Circle(F0_R, mode=Mode.SUBTRACT)
        with BuildLine():
            Line((66.6944829105, -8.8825266463), (70.6944829105, -8.8825266463))
            ThreePointArc((70.6944829105, -8.8825266463), (67.8660557858, -7.710953771), (66.6944829105, -4.8825266463))
            Line((66.6944829105, -4.8825266463), (66.6944829105, -8.8825266463))
        make_face()
        with BuildLine():
            Line((74.6944829105, -4.8825266463), (74.6944829105, -0.8825266463))
            Line((74.6944829105, -0.8825266463), (70.6944829105, -0.8825266463))
            ThreePointArc((70.6944829105, -0.8825266463), (73.5229100353, -2.0540995215), (74.6944829105, -4.8825266463))
        make_face()
        with BuildLine():
            Line((74.6944829105, -8.8825266463), (74.6944829105, -4.8825266463))
            ThreePointArc((74.6944829105, -4.8825266463), (73.5229100353, -7.710953771), (70.6944829105, -8.8825266463))
            Line((70.6944829105, -8.8825266463), (74.6944829105, -8.8825266463))
        make_face()
    extrude(amount=F2_DEPTH)


solid = f1.part
